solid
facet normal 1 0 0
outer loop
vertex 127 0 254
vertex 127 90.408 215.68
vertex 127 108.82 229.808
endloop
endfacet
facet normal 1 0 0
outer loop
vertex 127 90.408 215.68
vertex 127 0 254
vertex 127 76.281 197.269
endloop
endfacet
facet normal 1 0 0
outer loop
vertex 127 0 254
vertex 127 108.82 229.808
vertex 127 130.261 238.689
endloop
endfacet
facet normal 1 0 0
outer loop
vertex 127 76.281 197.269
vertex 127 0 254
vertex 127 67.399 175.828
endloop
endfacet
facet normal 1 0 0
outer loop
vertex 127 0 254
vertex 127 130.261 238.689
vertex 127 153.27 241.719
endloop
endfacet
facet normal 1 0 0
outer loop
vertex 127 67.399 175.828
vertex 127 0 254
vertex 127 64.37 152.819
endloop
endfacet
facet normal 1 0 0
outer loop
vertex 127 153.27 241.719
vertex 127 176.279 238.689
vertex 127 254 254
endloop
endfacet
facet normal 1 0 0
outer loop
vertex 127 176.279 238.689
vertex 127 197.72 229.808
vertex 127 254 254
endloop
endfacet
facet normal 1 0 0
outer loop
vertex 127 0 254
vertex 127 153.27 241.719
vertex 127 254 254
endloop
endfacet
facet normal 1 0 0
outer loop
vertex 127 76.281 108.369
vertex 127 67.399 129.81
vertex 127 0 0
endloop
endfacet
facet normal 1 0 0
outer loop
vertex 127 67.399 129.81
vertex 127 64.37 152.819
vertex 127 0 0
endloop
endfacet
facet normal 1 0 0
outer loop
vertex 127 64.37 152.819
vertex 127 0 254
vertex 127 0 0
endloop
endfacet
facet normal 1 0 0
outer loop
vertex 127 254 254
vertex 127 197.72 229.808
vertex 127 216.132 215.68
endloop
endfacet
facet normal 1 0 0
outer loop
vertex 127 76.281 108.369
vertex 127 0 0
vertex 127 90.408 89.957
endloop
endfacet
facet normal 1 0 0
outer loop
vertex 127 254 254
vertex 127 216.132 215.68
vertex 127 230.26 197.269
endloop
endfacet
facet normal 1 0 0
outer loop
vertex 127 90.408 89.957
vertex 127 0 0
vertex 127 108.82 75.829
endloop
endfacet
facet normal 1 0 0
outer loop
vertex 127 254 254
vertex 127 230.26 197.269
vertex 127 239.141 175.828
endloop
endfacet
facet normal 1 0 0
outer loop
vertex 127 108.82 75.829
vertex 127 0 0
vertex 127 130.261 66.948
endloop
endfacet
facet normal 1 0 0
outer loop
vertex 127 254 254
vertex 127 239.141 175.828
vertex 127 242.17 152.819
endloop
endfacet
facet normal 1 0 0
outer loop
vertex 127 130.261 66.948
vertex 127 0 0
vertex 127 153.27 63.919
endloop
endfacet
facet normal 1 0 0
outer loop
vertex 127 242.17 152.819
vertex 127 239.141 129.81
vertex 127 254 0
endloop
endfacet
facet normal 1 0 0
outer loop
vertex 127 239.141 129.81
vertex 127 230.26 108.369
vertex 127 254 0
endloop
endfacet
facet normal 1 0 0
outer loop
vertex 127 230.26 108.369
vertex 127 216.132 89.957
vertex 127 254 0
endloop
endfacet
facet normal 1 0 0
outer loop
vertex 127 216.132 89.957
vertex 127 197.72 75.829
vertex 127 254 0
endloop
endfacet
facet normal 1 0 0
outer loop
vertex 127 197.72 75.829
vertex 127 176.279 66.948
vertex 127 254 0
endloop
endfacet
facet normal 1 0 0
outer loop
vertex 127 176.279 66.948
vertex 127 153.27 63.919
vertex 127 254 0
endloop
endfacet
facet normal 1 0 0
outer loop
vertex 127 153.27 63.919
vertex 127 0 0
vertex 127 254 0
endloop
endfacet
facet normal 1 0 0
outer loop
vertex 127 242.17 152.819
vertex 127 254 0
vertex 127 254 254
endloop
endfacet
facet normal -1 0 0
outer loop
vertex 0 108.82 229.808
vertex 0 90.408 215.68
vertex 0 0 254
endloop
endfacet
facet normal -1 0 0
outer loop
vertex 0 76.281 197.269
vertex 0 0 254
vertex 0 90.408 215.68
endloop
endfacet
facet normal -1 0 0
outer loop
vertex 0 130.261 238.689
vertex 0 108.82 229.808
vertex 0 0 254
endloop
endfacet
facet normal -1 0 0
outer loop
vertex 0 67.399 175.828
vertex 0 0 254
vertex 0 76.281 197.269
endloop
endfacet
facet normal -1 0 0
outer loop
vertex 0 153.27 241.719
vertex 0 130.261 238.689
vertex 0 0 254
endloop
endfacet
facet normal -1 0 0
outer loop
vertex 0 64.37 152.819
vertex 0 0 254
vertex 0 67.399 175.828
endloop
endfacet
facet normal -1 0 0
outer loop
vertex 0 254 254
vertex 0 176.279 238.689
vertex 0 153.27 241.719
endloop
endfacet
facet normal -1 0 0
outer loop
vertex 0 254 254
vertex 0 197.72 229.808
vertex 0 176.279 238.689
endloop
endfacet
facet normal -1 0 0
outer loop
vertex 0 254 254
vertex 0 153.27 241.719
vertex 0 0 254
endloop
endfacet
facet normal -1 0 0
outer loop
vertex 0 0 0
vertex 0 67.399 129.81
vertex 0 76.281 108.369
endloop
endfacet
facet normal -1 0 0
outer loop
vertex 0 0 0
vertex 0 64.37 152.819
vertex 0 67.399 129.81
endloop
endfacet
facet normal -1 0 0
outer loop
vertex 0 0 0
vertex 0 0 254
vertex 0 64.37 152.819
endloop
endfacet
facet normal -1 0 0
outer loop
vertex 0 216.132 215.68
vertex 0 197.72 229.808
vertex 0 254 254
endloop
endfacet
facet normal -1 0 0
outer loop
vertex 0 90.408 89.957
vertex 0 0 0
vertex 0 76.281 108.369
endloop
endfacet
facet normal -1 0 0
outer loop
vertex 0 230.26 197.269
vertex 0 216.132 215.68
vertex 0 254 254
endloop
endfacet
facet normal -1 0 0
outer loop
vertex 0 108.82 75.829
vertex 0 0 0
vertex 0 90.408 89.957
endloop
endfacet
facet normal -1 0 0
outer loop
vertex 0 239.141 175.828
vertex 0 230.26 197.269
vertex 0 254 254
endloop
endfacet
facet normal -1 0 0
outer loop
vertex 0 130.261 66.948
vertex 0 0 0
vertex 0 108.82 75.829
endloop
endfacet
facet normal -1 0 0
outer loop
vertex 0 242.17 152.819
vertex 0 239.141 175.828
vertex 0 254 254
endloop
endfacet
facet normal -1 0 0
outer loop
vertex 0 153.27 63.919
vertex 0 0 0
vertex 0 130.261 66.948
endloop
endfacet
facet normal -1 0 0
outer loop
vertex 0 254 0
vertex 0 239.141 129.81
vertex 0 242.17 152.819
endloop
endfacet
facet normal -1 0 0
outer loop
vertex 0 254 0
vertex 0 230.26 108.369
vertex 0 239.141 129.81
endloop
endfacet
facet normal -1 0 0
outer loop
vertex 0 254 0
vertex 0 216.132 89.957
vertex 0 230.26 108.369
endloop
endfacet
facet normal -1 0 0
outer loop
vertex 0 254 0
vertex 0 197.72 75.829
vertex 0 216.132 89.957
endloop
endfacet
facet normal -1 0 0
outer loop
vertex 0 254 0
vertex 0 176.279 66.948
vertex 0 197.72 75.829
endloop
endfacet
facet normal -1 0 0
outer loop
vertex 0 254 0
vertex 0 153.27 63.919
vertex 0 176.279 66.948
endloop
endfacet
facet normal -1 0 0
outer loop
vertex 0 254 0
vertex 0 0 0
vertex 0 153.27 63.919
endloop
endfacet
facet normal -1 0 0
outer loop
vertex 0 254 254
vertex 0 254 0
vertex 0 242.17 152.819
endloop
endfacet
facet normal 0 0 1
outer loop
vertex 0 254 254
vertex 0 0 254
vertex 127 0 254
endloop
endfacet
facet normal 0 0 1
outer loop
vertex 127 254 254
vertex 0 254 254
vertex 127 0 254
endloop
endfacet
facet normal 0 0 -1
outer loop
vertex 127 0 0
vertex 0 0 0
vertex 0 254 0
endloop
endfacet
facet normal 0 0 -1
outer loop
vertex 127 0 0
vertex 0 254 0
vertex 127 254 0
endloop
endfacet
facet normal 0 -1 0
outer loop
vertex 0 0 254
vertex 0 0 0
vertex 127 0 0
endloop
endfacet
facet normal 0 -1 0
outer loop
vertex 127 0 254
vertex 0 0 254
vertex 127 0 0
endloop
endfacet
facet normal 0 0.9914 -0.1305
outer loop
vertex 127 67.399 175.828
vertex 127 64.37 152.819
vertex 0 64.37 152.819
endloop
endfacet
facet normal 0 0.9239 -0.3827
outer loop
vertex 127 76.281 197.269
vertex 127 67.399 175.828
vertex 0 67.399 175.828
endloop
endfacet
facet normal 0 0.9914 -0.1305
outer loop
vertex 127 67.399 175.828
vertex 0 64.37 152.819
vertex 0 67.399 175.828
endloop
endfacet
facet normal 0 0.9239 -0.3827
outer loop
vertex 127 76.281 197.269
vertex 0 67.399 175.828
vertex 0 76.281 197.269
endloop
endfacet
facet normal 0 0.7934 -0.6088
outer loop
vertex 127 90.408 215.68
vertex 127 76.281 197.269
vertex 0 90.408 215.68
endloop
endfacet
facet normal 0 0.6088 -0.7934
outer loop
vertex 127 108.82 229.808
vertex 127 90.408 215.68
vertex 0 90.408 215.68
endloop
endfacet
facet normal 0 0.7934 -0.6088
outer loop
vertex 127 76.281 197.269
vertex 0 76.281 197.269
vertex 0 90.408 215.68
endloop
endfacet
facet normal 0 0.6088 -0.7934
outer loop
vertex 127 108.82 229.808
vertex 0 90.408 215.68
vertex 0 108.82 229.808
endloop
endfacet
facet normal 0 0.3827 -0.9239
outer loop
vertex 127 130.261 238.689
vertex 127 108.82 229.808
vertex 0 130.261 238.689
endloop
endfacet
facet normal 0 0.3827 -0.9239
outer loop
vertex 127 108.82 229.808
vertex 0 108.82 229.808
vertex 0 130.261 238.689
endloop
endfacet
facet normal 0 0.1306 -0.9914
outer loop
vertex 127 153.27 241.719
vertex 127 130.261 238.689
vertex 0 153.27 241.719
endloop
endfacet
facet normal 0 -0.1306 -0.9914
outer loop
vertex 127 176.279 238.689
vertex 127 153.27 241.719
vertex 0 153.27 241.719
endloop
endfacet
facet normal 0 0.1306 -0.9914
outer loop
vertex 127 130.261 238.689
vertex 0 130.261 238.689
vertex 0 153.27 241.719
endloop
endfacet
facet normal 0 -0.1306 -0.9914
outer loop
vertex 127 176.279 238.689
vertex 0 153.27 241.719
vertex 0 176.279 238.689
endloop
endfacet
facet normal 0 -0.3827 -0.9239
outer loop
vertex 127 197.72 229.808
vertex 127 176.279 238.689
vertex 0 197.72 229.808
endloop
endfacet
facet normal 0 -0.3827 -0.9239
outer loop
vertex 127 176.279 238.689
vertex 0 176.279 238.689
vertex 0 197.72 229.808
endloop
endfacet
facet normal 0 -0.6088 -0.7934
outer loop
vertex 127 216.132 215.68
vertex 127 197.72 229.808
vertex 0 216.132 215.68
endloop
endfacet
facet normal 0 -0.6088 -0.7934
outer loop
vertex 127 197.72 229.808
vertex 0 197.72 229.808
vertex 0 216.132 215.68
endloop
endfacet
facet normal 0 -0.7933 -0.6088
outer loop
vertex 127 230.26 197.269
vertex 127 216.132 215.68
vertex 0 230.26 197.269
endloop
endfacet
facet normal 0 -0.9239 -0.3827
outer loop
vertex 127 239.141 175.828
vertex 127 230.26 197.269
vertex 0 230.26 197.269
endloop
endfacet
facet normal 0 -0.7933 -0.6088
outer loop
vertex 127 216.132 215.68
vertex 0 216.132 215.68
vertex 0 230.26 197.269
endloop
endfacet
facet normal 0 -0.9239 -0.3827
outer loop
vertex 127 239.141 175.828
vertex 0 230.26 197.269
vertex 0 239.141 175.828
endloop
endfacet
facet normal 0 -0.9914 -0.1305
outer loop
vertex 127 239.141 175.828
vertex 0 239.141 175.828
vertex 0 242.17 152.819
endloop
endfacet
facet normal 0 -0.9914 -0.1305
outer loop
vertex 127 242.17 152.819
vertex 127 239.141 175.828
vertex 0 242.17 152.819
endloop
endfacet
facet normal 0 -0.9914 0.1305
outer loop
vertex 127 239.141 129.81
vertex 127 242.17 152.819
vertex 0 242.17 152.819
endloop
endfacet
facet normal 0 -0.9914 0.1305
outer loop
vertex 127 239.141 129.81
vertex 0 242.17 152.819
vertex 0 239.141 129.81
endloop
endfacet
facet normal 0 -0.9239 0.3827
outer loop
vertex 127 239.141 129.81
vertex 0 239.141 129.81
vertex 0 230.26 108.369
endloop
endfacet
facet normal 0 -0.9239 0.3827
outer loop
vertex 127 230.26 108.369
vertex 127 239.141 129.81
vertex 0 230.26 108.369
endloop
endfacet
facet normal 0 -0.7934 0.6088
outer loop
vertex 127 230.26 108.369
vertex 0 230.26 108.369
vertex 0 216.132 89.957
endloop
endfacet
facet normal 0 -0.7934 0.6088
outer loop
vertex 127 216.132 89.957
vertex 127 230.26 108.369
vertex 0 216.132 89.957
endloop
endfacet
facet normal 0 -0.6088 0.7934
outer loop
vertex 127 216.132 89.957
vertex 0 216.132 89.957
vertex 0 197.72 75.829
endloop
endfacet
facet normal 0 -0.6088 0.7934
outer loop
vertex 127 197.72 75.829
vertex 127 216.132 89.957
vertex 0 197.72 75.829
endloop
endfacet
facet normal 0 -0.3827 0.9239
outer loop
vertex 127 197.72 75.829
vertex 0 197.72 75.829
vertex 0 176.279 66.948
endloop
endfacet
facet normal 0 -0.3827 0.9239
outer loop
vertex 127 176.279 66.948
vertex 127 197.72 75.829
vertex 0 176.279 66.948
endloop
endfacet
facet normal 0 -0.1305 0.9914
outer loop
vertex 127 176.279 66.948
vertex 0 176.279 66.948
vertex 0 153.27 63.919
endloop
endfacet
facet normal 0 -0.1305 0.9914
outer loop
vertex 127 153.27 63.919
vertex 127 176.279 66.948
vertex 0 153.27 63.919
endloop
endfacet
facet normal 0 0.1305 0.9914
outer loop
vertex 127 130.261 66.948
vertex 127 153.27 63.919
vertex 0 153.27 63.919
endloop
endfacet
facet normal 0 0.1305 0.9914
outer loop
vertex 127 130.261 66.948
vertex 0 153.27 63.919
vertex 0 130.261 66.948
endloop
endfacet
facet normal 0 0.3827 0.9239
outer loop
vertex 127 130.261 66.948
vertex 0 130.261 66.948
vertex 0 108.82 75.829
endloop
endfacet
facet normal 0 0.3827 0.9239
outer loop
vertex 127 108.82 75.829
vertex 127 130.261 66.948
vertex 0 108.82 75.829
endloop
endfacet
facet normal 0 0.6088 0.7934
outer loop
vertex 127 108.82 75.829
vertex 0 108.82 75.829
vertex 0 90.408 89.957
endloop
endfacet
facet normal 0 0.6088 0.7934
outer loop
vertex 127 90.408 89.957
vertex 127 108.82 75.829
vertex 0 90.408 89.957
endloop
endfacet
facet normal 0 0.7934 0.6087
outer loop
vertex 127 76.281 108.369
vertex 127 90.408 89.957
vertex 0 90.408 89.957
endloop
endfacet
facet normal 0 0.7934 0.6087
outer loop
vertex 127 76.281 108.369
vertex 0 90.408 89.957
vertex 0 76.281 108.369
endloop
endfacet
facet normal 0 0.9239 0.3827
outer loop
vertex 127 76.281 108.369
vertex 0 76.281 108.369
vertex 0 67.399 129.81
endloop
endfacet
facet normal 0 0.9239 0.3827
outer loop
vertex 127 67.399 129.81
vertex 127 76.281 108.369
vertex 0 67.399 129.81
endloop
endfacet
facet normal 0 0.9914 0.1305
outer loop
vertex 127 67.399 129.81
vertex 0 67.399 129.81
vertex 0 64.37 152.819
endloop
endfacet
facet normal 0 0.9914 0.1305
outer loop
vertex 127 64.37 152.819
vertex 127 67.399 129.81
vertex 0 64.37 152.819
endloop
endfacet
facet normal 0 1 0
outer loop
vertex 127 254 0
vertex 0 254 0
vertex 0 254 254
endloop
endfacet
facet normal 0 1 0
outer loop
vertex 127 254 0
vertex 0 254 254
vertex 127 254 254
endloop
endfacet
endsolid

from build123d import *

# Parameters (mm, degrees)
F0_W           = 127
F0_H           = 254
F1_DEPTH       = 254
F3_D           = 127
F3_CBORE_D     = 177.8
F3_CBORE_DEPTH = 127


with BuildPart() as f1:
    # F0 (on Top) → F1 (new body)
    with BuildSketch(Plane.XY):
        with Locations((63.5, 127)):
            Rectangle(F0_W, F0_H)
    extrude(amount=F1_DEPTH)

    # F3 (through all)
    with Locations(Plane(origin=(0, 0, 0), x_dir=(0, -1, 0), z_dir=(-1, 0, 0))):
        with Locations((-153.27017, 152.818576)):
            CounterBoreHole(F3_D / 2, F3_CBORE_D / 2, F3_CBORE_DEPTH)


solid = f1.part
